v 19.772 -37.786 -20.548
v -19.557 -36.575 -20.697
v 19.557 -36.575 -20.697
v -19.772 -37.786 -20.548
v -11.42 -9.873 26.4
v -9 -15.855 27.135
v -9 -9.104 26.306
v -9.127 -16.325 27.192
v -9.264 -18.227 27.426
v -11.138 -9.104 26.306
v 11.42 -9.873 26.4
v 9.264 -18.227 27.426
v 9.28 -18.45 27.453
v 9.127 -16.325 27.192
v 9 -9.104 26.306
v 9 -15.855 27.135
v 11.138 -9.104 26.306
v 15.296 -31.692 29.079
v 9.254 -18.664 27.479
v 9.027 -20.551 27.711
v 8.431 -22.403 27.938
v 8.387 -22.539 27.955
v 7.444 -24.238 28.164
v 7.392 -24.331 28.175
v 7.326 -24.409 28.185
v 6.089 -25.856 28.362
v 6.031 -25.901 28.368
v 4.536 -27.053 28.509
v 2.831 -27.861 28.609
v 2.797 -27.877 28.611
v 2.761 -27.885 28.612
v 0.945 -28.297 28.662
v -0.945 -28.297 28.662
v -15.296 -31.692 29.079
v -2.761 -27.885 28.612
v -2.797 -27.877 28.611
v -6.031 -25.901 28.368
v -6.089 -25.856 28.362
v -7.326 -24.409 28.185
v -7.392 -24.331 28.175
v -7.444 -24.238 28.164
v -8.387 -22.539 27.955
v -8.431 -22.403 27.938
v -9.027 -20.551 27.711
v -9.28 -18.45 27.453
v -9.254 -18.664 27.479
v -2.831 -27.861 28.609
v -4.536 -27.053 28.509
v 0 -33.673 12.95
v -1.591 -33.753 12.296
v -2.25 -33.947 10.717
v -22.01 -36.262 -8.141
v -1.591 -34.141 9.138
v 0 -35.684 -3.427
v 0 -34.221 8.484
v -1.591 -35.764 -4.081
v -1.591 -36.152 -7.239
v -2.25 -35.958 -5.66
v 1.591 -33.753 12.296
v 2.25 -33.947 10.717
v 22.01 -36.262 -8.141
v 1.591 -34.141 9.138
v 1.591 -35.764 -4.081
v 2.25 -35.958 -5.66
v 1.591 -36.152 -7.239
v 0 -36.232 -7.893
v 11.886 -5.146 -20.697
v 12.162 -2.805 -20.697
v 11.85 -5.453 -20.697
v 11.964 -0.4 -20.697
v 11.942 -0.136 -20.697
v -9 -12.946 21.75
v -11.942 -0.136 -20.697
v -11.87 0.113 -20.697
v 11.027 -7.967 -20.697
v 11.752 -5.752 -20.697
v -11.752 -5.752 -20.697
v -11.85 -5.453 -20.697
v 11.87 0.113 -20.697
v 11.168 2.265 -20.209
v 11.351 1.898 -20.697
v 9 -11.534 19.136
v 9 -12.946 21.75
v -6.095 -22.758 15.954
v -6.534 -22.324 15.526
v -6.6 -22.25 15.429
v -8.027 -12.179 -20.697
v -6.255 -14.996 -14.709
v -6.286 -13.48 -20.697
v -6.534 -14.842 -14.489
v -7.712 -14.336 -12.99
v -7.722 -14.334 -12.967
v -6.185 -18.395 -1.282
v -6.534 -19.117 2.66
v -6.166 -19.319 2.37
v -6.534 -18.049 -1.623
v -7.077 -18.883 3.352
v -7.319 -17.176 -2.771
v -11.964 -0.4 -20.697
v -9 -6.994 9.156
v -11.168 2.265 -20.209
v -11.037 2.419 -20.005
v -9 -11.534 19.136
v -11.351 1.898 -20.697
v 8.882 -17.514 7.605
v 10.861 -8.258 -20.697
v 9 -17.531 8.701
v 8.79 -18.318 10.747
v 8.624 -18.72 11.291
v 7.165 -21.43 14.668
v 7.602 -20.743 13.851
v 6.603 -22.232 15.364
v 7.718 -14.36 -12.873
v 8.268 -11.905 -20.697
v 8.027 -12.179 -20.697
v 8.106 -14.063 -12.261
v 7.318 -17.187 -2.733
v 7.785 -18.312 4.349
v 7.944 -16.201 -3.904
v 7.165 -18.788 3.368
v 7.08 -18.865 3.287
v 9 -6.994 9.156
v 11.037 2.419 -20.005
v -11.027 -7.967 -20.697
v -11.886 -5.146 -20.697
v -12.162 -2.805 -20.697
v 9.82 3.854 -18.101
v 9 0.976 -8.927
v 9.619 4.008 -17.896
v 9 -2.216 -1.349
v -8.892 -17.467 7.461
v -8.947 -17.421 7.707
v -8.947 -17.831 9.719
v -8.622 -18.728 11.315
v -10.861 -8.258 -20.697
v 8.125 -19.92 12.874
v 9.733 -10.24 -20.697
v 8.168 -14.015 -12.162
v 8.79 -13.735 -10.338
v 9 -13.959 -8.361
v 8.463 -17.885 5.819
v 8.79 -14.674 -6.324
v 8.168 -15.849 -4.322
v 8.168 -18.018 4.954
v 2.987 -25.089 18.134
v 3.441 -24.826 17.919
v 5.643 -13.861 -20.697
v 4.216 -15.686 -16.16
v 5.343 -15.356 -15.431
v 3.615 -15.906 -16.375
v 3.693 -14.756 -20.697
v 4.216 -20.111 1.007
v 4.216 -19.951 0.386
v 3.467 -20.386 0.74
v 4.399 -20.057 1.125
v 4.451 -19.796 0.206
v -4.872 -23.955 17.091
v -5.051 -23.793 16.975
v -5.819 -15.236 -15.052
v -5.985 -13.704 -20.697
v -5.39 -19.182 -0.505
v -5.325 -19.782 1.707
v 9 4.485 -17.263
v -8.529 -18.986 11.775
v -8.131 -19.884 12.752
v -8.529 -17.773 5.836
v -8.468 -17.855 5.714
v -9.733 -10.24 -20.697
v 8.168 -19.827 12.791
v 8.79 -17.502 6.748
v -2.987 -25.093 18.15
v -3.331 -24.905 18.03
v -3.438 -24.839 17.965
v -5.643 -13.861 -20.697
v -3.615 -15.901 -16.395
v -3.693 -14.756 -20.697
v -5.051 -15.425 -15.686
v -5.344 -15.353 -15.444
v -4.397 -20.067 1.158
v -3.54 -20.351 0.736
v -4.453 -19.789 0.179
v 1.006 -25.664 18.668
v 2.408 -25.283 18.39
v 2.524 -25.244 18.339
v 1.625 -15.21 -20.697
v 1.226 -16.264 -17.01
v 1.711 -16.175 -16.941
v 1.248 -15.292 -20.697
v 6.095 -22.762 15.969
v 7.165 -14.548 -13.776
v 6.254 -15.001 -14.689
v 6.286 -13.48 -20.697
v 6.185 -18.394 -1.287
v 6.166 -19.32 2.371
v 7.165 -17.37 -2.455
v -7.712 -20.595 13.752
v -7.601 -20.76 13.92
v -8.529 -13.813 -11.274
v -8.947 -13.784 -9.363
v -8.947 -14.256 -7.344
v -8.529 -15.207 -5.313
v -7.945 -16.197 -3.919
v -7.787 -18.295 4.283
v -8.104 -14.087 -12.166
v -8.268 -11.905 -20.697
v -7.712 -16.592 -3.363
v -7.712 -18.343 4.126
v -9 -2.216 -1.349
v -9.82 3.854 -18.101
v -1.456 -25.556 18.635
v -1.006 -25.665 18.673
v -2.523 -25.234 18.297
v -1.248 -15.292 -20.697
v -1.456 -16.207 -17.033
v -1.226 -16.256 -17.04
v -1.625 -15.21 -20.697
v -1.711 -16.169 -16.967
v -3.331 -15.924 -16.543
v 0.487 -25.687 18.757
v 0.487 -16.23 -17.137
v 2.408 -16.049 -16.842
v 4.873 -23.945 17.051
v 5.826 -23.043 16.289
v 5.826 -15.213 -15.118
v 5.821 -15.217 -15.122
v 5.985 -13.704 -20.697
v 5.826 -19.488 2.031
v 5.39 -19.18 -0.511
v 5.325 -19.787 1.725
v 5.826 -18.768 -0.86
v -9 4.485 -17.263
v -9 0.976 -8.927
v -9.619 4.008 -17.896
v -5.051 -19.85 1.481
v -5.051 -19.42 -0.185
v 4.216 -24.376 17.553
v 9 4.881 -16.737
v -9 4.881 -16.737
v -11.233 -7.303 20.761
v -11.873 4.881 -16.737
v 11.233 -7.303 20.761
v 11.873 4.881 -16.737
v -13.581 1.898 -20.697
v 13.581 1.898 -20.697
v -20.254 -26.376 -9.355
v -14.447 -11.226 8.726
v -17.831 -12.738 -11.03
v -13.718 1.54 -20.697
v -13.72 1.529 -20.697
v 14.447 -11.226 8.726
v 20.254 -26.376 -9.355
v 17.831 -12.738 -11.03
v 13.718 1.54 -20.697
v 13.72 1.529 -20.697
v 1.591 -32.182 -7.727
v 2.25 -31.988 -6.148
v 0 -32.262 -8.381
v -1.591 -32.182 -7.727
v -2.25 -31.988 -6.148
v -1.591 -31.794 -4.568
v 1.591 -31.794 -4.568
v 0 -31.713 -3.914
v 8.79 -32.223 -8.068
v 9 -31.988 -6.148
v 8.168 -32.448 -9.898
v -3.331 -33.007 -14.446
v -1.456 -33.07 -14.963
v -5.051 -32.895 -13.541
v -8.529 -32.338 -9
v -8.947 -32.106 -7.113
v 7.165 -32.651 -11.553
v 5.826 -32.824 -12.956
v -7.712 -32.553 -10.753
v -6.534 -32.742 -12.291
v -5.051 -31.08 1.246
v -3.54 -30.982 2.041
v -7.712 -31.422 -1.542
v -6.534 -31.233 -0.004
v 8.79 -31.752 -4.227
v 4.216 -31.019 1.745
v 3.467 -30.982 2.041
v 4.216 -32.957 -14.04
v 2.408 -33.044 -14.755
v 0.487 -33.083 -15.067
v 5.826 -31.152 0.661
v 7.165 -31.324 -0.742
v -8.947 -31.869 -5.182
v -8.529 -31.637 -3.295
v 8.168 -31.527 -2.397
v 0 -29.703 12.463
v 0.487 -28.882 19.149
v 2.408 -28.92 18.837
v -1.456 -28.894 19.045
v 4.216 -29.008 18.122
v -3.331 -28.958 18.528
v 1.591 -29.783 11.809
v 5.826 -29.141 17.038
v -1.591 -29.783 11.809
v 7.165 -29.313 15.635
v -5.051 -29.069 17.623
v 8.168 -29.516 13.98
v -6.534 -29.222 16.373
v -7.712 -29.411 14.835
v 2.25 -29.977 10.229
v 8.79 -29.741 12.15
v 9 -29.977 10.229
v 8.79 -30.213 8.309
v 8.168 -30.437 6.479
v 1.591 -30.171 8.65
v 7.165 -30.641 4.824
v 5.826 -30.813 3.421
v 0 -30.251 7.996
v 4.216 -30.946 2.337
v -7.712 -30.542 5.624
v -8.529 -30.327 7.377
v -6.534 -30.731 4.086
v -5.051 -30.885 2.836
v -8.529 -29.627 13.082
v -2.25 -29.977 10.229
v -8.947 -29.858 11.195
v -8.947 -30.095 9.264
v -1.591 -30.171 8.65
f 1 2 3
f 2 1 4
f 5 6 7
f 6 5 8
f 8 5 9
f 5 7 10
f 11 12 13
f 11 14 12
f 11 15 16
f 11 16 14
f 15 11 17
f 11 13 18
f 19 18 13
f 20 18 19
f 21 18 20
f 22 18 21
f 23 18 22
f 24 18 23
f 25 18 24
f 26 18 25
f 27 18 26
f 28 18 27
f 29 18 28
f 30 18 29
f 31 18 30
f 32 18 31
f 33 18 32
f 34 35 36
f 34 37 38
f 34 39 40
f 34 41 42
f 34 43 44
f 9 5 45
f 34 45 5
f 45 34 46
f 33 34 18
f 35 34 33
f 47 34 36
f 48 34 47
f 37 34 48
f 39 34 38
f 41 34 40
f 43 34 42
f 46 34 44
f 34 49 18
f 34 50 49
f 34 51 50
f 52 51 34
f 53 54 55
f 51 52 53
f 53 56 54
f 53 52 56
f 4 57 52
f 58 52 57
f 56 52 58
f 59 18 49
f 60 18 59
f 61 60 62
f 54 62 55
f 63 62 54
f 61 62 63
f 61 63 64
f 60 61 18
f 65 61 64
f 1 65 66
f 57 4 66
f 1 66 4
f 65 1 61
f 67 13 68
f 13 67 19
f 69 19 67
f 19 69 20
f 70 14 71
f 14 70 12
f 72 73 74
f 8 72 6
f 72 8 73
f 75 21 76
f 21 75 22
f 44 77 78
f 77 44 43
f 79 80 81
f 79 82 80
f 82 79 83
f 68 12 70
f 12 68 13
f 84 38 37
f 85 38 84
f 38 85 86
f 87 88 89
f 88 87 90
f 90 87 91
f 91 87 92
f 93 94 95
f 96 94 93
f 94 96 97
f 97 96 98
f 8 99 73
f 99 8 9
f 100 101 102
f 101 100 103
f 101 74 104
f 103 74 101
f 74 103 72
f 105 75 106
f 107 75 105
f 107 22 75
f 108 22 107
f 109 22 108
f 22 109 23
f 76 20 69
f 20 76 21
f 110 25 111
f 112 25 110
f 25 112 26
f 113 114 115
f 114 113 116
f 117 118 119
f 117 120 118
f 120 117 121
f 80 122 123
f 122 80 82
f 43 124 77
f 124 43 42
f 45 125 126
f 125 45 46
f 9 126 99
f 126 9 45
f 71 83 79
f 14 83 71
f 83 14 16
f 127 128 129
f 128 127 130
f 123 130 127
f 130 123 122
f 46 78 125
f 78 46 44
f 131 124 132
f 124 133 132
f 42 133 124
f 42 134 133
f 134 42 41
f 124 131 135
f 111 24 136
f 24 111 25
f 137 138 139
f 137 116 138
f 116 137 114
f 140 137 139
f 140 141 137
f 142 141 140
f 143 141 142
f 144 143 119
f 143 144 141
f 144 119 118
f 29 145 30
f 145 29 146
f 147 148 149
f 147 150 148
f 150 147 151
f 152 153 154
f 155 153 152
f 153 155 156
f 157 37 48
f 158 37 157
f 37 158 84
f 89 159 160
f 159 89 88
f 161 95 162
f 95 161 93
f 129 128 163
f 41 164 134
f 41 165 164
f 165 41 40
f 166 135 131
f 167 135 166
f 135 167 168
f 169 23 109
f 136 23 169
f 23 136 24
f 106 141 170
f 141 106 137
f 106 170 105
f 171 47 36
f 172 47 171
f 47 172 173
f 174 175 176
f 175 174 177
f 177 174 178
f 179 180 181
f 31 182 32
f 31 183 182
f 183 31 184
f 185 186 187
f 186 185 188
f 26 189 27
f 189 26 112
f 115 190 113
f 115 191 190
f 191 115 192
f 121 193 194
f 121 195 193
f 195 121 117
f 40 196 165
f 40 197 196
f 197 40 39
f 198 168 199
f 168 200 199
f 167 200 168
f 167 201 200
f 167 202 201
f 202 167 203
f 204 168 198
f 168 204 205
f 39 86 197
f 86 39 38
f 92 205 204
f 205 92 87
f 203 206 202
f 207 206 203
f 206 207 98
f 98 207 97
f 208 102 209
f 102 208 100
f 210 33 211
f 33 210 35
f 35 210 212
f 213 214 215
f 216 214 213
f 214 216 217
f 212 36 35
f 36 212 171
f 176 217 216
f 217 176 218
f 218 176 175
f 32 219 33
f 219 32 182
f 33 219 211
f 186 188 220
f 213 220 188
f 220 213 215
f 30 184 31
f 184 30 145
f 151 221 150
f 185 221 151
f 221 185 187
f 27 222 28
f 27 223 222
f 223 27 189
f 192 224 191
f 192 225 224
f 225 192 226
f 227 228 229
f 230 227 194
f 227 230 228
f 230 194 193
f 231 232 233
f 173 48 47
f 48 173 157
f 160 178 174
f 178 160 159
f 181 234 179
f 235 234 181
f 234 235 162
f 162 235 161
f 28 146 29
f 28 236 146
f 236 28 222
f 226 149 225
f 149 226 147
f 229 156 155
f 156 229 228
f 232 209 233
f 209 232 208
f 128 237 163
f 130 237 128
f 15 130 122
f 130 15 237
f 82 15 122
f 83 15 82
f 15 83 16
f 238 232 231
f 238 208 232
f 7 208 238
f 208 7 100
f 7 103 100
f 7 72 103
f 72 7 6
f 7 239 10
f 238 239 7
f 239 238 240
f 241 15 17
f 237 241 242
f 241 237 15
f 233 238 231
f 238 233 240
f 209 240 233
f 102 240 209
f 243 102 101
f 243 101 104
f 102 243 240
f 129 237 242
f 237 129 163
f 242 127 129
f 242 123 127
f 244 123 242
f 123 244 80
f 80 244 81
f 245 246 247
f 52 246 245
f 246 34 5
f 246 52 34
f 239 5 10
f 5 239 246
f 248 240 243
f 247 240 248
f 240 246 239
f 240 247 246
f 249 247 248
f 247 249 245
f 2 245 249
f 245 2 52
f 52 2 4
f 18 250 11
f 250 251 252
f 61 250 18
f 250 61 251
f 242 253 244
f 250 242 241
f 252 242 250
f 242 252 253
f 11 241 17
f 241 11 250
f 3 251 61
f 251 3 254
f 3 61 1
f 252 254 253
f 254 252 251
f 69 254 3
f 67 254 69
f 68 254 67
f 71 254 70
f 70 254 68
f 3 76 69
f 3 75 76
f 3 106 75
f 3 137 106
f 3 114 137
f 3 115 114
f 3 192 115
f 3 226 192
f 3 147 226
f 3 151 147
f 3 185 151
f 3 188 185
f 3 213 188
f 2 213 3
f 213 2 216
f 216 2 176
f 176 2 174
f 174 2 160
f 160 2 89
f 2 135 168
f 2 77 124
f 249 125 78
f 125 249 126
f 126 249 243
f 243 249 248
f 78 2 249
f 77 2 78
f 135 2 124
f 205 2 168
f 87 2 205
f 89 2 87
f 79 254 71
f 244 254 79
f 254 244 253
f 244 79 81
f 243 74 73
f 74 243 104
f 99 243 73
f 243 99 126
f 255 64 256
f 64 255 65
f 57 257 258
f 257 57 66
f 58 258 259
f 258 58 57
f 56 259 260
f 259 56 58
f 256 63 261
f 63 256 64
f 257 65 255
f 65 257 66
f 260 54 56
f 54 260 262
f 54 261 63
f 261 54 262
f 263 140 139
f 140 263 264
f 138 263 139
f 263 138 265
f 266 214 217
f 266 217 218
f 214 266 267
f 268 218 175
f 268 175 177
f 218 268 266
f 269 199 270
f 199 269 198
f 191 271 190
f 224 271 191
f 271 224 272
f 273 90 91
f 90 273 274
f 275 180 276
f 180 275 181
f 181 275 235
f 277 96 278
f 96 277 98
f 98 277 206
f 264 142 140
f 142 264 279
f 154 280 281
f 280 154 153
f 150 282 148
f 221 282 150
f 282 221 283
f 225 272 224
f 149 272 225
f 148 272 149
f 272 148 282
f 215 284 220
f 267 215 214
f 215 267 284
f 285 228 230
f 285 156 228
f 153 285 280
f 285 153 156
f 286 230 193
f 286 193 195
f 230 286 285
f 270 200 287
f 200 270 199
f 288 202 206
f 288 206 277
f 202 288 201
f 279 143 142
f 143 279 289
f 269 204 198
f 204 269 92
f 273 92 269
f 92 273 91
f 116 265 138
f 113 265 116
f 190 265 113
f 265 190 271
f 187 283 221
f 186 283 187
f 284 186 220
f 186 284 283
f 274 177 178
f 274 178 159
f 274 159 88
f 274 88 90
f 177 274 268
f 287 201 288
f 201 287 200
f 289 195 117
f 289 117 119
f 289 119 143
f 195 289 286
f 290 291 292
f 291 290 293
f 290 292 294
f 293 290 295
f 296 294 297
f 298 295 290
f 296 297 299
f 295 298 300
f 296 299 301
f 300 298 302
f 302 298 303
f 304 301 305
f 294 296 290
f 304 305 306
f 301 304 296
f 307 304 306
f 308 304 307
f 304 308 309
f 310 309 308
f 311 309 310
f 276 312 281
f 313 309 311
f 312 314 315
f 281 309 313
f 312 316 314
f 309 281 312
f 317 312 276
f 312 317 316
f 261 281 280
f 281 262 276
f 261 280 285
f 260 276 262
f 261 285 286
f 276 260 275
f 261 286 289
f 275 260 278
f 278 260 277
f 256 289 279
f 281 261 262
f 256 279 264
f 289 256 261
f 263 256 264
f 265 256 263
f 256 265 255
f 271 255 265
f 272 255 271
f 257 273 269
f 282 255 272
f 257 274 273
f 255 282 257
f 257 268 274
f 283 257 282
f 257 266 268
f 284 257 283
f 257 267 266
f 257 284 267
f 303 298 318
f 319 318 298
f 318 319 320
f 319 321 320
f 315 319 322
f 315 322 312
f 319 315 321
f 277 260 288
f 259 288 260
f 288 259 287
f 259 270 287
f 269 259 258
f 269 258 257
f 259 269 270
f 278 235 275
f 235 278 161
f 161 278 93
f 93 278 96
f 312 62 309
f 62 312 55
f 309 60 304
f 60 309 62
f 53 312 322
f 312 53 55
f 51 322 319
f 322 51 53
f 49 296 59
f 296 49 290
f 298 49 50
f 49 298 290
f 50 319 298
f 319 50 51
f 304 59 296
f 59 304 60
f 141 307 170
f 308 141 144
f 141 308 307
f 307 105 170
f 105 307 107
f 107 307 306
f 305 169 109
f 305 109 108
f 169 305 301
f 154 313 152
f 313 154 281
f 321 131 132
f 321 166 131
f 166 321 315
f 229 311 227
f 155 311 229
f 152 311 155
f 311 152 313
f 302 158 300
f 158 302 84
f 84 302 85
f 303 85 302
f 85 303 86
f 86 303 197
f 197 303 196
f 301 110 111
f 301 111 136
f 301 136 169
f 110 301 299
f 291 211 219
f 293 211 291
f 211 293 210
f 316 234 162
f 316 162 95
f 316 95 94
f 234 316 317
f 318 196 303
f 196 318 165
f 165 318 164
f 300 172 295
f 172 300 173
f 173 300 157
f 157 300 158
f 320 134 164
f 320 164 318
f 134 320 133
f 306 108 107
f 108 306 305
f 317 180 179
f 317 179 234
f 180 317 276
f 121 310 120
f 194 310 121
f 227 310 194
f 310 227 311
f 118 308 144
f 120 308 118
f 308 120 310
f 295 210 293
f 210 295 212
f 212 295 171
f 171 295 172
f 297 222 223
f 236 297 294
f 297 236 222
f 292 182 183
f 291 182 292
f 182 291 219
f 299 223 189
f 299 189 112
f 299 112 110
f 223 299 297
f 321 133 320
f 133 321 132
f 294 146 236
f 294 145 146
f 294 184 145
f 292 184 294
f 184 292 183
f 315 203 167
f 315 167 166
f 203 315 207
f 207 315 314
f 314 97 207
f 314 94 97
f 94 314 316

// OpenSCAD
$screw_distance = 16.5;


rotate([-187,0,0]) {
difference() {
	// basic block
	cube([80, 70, 50], true);
	
	// circular hole for showerhead
	translate([0, 10, 0]) {
		rotate([25,0,0]) {
			cylinder(65, 9, 12.7, true);
		}
	}
	translate([0, -27, 0]) {
		rotate([25,0,0]) {
			cube([18, 70, 100], true);
		}
	}
	
	// front edge cutoff bottom
	translate([0, -27, 0]) {
		rotate([25,0,0]) {
			cube([90, 50, 100], true);
		}
	}
	// front edge cutoff top
	translate([0, -45, 0]) {
		rotate([-30,0,0]) {
			cube([90, 50, 100], true);
		}
	}
	
	// side cutoff left
	translate([-60, 0, 0]) {
		rotate([30,-10,10]) {
			cube([90, 100, 100], true);
		}
	}
	
	// side cutoff left front
	translate([-60, 0, 0]) {
		rotate([30,-10,20]) {
			cube([90, 100, 100], true);
		}
	}
	
	// side cutoff left top
	translate([-60, 0, 25]) {
		rotate([30,10,10]) {
			cube([90, 100, 100], true);
		}
	}
	
	// side cutoff right
	translate([60, 0, 0]) {
		rotate([30,10,-10]) {
			cube([90, 100, 100], true);
		}
	}
	
	// side cutoff right front
	translate([60, 0, 0]) {
		rotate([30,10,-20]) {
			cube([90, 100, 100], true);
		}
	}

	// side cutoff right top
	translate([60, 0, 25]) {
		rotate([30,-10,-10]) {
			cube([90, 100, 100], true);
		}
	}
	
	// top cutoff
	translate([0, -10, 70]) {
		rotate([7,0,0]) {
			cube([90, 120, 100], true);
		}
	}
	
	// screw inset top
	translate([0, 20, 10]) {
		rotate([90,0,0]) {
			cylinder(  50,    2.25,    2.25, true);
		}
	}
	translate([0, 21, 10]) {
		rotate([90,0,0]) {
			cylinder(  20,    9,    9, true);
		}
	}
	
	// screw inset bottom
	translate([0, 20, 10-$screw_distance]) {
		rotate([90,0,0]) {
			cylinder(  50,    2.25,    2.25, true);
		}
	}
	translate([0, 21, 10-$screw_distance]) {
		rotate([90,0,0]) {
			cylinder(  20,    9,    9, true);
		}
	}
}
}
